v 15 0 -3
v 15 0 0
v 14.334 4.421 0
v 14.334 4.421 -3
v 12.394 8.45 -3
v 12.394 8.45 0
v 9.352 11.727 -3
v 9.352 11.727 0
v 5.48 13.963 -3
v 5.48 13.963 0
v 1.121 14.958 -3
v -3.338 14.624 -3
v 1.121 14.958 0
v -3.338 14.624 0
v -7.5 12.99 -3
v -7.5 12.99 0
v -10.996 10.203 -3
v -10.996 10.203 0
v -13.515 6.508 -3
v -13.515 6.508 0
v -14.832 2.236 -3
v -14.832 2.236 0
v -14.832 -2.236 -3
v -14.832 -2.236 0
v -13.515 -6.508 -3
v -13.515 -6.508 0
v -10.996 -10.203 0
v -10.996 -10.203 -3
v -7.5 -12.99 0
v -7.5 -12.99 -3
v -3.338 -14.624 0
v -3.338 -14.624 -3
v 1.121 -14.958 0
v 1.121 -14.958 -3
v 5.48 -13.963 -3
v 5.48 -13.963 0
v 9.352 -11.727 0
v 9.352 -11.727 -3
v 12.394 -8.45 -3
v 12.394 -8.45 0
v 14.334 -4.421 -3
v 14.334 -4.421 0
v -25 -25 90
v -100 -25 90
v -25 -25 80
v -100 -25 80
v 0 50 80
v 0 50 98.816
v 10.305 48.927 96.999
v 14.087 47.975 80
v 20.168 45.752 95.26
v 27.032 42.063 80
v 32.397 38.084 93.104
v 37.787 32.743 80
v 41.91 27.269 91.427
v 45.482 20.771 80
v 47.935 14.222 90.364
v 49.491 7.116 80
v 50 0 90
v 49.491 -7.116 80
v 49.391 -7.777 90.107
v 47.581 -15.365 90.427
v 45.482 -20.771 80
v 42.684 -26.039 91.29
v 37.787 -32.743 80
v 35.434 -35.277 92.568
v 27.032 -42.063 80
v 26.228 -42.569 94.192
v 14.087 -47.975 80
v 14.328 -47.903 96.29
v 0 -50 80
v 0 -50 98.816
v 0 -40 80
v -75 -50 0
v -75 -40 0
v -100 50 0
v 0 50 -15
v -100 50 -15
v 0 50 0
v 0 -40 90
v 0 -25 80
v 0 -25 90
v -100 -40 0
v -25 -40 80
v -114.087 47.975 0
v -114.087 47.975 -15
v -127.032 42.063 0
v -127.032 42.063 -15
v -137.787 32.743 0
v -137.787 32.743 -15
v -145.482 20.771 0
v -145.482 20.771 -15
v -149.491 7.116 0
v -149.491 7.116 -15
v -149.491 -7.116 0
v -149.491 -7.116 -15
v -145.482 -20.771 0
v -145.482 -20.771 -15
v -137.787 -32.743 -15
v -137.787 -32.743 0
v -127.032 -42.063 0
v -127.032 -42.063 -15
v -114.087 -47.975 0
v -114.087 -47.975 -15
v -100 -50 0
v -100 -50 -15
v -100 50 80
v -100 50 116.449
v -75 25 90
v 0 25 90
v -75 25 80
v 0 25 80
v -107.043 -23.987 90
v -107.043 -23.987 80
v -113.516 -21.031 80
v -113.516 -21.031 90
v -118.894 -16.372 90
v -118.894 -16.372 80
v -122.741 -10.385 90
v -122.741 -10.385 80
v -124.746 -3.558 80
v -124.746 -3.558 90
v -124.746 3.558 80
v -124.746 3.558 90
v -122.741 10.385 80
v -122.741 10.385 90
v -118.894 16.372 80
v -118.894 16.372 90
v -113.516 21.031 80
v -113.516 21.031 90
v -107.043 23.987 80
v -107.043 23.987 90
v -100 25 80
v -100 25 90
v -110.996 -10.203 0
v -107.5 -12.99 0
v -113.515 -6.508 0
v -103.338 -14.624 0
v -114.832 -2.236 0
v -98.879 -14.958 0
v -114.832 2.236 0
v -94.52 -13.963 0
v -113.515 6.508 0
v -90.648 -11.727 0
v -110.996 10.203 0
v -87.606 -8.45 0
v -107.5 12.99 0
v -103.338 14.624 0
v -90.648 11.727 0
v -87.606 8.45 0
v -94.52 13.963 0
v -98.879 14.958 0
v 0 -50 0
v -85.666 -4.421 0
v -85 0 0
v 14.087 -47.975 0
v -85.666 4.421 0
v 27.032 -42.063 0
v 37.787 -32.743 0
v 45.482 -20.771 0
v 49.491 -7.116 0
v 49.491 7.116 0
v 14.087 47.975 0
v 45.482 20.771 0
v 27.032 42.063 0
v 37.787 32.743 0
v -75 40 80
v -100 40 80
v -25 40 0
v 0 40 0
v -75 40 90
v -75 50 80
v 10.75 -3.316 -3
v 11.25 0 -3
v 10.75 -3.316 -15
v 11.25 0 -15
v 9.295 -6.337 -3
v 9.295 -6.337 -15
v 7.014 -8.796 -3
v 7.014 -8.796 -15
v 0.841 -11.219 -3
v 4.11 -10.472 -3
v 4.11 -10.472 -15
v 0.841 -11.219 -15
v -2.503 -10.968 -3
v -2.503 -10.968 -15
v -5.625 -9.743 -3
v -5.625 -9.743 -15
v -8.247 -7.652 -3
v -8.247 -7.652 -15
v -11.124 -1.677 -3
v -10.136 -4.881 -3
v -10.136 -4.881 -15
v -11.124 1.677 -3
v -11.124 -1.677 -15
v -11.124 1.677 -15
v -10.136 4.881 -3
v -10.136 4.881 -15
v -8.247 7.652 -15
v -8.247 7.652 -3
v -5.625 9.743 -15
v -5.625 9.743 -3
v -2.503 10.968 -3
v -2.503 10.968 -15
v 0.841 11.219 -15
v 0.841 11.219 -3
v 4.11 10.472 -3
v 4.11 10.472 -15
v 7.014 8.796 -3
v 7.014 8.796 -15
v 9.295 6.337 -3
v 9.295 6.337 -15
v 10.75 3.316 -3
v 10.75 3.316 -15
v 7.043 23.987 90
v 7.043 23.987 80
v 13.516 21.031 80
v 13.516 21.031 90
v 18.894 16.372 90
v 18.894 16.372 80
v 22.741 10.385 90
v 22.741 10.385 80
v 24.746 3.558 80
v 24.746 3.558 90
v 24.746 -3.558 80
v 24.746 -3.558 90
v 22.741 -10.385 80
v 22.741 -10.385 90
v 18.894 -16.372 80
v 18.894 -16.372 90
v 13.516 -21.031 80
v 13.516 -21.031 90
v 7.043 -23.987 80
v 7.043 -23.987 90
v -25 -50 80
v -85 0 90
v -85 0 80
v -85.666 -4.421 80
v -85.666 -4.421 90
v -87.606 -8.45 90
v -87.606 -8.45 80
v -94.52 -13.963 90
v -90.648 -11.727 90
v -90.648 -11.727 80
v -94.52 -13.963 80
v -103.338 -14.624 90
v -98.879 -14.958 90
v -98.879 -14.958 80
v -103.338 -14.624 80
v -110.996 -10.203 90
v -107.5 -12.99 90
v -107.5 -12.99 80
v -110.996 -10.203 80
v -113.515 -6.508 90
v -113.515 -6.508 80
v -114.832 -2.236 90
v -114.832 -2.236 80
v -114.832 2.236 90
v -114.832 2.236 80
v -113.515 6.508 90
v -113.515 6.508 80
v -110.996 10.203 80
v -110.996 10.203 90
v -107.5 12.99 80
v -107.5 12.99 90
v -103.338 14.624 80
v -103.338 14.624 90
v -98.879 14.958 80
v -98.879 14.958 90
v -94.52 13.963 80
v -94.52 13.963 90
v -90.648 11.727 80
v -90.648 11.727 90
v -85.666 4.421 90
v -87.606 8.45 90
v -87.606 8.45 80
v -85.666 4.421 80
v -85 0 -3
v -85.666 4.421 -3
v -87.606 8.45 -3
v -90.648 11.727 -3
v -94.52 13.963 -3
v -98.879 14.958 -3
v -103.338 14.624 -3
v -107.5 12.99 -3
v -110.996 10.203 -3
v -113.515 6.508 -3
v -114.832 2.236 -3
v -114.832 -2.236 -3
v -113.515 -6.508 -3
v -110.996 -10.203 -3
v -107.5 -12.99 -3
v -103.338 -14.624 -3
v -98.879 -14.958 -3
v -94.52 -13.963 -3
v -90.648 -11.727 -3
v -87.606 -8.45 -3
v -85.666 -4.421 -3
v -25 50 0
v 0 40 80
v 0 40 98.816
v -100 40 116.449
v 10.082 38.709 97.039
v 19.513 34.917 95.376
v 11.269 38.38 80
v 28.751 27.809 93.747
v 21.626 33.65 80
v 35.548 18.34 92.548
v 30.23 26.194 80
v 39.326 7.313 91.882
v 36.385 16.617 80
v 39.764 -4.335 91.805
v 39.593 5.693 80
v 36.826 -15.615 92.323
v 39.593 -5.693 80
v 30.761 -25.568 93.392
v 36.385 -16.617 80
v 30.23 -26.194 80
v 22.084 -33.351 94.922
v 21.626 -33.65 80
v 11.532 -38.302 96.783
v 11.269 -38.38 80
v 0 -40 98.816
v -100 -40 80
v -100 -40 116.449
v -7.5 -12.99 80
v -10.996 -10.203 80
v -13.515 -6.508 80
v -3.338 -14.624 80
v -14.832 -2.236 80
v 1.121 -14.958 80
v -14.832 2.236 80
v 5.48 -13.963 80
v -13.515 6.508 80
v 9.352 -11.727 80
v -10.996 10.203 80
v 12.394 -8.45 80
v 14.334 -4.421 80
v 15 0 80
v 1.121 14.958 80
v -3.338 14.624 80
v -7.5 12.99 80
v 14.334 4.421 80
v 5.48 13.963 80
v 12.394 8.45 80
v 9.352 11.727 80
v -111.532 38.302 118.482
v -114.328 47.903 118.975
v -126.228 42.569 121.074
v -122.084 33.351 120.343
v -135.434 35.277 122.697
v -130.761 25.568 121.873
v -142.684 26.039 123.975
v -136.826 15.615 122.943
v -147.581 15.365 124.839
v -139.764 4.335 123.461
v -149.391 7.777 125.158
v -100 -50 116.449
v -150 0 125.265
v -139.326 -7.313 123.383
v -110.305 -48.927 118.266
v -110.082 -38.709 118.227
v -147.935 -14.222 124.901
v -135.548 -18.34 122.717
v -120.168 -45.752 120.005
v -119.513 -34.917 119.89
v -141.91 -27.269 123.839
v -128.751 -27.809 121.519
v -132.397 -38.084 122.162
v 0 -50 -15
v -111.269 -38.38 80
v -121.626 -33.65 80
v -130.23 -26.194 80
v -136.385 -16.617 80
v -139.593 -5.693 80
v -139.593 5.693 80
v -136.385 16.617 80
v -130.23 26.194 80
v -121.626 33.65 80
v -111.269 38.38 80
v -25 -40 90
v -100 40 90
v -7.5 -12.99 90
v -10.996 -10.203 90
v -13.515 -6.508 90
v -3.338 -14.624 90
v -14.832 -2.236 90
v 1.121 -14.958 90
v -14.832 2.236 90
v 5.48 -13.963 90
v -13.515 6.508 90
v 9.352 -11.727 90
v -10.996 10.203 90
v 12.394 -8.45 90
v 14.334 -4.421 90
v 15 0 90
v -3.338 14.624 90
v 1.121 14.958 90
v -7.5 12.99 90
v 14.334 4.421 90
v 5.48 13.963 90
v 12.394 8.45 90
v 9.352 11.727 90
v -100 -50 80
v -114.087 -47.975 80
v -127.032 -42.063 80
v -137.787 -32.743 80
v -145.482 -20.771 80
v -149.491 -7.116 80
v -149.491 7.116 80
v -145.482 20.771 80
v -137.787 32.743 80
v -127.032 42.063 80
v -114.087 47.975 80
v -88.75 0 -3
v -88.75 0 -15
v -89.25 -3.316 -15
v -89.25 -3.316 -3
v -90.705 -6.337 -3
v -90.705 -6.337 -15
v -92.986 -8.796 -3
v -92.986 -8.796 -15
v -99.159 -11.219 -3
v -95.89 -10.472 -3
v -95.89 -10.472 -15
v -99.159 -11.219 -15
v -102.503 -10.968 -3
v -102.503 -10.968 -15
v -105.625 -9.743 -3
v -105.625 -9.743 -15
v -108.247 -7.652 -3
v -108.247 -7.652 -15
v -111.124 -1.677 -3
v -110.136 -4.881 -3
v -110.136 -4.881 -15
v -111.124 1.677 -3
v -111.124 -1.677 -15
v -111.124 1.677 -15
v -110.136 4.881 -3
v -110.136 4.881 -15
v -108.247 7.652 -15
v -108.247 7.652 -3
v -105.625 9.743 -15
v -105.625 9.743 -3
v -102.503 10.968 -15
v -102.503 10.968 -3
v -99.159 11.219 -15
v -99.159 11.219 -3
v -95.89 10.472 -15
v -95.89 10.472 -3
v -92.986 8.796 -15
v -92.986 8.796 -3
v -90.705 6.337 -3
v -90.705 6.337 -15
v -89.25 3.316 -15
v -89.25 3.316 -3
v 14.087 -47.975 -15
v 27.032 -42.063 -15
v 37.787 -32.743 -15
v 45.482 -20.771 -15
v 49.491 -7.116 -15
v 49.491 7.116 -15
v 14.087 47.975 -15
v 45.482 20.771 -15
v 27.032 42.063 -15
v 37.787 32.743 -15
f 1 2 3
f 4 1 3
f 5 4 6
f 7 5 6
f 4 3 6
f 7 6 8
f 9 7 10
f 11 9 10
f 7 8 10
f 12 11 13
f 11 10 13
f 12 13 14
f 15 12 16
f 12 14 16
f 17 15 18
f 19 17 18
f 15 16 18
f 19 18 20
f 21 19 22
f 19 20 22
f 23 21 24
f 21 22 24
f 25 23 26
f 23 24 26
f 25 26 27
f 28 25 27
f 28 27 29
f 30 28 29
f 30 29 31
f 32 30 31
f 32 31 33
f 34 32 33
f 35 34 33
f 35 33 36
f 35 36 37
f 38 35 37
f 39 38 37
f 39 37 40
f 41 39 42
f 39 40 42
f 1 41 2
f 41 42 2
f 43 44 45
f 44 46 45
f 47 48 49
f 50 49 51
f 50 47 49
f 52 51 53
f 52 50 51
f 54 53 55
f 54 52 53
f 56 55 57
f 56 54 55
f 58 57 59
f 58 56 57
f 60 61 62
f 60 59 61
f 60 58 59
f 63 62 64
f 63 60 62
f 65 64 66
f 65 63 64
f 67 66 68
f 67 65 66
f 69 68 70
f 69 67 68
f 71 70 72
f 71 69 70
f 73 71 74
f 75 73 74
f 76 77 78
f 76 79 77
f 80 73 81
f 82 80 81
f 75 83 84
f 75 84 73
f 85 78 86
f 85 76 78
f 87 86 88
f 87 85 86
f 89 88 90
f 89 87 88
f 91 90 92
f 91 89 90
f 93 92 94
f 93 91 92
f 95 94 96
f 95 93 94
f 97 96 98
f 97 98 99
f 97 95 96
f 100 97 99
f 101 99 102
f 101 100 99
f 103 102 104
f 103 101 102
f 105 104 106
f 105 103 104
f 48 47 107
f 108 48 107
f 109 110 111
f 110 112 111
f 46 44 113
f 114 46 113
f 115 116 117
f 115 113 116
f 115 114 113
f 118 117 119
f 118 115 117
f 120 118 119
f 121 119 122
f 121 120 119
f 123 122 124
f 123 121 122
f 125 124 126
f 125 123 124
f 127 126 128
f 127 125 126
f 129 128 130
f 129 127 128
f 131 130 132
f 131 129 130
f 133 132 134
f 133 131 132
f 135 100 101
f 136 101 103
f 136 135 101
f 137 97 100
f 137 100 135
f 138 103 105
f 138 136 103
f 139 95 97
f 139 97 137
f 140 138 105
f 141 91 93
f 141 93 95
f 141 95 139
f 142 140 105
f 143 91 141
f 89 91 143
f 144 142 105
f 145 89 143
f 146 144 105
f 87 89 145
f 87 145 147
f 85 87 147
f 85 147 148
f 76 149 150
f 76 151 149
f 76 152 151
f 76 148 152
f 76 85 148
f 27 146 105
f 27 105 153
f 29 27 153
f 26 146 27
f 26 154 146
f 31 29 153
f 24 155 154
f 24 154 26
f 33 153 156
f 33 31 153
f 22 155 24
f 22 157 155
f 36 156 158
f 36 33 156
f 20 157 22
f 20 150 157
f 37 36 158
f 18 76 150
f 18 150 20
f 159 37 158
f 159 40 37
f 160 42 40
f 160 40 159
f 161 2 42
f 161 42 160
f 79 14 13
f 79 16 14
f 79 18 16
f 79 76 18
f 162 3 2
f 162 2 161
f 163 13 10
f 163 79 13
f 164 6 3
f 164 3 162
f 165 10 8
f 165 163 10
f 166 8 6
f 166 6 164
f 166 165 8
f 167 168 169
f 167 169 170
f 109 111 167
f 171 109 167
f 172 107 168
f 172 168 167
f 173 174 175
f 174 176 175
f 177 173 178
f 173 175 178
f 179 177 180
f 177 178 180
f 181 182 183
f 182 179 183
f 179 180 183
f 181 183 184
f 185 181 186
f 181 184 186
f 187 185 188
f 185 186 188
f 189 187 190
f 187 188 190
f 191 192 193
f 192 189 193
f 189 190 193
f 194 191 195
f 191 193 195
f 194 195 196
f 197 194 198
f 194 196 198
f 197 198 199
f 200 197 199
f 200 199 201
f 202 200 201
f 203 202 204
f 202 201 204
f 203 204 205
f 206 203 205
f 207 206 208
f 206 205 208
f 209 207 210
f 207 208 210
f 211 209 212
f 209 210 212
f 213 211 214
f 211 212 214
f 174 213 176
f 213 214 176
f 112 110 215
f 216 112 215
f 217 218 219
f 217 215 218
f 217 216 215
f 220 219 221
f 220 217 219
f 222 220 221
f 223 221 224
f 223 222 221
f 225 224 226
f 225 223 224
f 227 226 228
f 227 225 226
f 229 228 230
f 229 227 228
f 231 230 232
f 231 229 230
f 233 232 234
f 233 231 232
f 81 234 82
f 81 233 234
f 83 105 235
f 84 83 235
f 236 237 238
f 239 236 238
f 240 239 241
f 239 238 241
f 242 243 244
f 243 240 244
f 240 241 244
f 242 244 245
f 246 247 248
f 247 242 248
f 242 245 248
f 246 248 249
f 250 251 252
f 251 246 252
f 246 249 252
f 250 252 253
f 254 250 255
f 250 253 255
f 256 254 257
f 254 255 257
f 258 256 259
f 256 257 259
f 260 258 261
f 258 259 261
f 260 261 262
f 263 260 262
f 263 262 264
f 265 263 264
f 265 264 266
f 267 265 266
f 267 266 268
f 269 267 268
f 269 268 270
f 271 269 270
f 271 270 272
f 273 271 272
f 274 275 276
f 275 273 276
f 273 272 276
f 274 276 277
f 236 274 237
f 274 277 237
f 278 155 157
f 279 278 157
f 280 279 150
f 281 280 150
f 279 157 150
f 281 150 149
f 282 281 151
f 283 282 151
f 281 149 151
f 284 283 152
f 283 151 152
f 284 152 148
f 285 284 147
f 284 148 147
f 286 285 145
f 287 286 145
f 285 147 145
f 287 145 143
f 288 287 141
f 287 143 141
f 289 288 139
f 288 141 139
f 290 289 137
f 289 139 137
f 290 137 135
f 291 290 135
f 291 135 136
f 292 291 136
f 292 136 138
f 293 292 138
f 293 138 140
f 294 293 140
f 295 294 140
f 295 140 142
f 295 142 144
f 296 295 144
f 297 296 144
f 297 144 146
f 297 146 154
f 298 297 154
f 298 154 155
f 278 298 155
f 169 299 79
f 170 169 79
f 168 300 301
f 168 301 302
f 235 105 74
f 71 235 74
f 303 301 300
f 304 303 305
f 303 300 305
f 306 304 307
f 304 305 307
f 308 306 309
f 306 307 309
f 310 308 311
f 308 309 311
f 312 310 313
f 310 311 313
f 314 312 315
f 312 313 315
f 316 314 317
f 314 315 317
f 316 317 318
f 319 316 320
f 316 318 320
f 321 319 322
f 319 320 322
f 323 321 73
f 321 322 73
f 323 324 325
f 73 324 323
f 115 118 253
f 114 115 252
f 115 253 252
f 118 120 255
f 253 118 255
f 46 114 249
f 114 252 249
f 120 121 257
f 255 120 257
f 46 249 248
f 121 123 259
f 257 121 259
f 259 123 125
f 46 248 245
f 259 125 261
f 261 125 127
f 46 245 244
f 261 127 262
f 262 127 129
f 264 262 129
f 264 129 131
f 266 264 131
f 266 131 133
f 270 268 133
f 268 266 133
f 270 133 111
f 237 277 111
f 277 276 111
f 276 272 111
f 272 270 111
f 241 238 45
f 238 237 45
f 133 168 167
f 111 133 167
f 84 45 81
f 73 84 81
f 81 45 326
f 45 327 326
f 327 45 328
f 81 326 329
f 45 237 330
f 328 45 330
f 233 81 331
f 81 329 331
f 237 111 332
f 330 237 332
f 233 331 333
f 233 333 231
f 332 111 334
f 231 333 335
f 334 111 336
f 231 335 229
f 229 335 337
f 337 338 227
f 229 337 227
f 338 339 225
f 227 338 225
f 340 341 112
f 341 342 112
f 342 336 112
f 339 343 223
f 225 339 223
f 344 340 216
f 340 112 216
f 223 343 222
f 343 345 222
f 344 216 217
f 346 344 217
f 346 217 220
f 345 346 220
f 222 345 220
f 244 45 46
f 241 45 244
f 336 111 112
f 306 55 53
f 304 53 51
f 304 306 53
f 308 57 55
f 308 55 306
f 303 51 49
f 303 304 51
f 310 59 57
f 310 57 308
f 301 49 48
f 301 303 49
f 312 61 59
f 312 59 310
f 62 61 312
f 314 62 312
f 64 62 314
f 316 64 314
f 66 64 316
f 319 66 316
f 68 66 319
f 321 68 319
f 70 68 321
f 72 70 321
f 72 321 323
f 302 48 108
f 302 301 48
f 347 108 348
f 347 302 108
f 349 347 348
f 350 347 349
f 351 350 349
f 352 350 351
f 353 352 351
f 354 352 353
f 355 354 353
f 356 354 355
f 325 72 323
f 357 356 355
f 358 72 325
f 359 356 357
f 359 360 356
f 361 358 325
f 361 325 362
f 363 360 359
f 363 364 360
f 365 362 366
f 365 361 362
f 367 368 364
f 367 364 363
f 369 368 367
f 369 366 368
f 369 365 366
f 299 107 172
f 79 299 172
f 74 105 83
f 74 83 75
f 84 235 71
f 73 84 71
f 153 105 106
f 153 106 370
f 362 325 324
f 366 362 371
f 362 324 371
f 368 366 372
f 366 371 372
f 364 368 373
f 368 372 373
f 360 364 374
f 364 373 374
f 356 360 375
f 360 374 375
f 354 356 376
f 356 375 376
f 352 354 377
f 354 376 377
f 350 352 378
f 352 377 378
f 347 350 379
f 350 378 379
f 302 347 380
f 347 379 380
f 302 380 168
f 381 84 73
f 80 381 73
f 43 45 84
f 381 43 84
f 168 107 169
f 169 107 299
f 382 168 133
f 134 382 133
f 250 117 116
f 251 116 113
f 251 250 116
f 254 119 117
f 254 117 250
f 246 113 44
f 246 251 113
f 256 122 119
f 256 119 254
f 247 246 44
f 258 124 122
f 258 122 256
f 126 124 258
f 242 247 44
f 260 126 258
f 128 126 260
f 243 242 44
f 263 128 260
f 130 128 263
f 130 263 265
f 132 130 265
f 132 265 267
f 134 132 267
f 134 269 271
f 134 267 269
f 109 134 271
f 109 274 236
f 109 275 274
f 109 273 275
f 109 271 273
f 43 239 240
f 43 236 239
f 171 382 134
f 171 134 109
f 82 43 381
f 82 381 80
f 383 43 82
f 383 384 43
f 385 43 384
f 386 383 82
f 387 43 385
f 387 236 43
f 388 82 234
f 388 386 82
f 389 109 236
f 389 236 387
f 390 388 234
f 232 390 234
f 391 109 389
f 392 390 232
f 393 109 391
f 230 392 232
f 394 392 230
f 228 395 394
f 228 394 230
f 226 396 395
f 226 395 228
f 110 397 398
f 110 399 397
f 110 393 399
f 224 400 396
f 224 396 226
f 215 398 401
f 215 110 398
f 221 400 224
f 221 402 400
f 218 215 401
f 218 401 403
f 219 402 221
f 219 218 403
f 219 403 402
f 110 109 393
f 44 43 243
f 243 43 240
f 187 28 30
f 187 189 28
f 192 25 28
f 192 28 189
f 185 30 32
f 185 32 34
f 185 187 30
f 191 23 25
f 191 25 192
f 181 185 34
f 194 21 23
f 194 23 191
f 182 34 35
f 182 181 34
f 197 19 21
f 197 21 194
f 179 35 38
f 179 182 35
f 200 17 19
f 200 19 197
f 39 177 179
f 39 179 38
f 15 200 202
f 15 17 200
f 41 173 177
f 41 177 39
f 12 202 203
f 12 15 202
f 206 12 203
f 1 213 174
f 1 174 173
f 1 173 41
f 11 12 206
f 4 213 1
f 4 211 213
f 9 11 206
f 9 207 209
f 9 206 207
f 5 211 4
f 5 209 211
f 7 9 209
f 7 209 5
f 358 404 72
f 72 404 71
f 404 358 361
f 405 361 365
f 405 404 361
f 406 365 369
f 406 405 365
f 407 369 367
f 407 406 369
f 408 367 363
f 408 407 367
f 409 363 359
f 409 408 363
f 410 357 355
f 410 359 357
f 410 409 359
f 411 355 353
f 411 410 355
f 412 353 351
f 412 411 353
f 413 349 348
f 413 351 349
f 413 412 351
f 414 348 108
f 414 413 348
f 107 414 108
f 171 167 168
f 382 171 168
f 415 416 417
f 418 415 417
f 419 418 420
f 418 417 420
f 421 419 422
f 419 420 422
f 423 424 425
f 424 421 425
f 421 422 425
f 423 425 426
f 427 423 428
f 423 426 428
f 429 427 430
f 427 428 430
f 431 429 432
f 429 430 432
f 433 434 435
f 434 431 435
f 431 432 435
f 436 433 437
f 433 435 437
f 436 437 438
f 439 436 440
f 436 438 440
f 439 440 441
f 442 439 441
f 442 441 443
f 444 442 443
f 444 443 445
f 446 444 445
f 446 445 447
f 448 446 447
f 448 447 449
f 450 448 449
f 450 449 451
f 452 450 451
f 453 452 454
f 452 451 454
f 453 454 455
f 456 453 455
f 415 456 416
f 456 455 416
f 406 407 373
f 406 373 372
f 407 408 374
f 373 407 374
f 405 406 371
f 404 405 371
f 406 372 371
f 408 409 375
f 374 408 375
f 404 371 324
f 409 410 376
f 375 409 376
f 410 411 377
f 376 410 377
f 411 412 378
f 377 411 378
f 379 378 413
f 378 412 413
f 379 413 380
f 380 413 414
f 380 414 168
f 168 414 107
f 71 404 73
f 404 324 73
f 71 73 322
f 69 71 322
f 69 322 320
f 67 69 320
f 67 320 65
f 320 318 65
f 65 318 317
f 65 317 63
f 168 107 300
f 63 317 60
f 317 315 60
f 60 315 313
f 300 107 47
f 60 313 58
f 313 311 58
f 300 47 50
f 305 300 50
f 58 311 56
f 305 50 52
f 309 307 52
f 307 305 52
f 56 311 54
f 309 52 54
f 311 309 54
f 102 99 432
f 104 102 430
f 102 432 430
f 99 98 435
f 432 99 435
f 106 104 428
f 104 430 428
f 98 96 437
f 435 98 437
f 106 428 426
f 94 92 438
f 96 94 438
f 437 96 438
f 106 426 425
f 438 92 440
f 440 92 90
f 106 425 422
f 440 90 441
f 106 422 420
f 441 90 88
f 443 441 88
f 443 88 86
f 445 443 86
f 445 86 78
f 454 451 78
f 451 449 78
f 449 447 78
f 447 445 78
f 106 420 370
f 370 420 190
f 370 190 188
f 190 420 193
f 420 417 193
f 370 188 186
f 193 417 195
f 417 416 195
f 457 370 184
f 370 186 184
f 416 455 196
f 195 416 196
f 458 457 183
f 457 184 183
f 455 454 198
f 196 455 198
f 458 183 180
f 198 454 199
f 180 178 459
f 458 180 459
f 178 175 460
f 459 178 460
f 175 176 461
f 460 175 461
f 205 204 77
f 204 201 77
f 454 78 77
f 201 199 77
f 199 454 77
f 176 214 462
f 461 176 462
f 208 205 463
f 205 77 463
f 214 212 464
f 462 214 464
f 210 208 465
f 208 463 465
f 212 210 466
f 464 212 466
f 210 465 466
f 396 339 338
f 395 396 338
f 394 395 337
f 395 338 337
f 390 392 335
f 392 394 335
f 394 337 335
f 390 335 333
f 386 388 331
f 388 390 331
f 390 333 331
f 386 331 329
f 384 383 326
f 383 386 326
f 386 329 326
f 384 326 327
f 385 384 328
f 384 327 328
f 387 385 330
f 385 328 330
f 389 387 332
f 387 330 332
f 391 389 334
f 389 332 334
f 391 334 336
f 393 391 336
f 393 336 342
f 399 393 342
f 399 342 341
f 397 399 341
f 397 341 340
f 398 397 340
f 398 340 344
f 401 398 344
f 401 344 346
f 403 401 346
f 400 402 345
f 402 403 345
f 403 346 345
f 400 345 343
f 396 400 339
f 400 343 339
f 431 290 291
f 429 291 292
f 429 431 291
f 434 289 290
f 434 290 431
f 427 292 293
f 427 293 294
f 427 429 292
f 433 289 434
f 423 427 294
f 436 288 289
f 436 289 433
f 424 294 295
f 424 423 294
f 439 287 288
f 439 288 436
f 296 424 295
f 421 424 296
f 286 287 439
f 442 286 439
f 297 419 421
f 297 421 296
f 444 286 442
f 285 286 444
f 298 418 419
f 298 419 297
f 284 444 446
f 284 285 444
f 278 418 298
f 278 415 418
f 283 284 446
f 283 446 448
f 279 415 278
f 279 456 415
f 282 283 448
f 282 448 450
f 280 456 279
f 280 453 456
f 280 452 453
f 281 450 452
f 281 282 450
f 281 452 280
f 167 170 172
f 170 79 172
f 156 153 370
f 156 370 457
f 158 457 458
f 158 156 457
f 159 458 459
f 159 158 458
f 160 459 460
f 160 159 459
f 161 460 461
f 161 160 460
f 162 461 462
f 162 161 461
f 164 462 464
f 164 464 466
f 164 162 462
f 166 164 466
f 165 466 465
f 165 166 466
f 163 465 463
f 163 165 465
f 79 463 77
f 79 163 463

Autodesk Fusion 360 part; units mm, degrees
sketch "Sketch1" plane through (0, 0, 0) normal (0, 0, 1) x (1, 0, 0)
  line L0 (0, 50) -> (-100, 50)
  arc A0 (-100, 50) -> (-100, -50) centre (-100, 0) ccw
  line L1 (-100, -50) -> (0, -50)
  arc A1 (0, -50) -> (0, 50) centre (0, 0) ccw
  line L2 (0, 0) -> (-100, 0) construction
  line L3 (-100, -40) -> (0, -40)
  arc A2 (0, -40) -> (0, 40) centre (0, 0) ccw
  line L4 (0, 40) -> (-100, 40)
  arc A3 (-100, 40) -> (-100, -40) centre (-100, 0) ccw
  arc A4 (-100, 25) -> (-100, -25) centre (-100, 0) ccw
  line L5 (-100, -25) -> (0, -25)
  arc A5 (0, -25) -> (0, 25) centre (0, 0) ccw
  line L6 (0, 25) -> (-100, 25)
  circle A6 centre (0, 0) radius 11.25
  circle A7 centre (0, 0) radius 15
  circle A8 centre (-100, 0) radius 11.25
  circle A9 centre (-100, 0) radius 15
  line L7 (-100, 25) -> (-75, 25)
  line L8 (-75, 25) -> (-75, 40)
  line L9 (-75, 40) -> (-100, 40)
  line L10 (-100, 40) -> (-100, 25)
  line L11 (0, -25) -> (-25, -25)
  line L12 (-25, -25) -> (-25, -40)
  line L13 (-25, -40) -> (0, -40)
  line L14 (0, -40) -> (0, -25)
  dimension "d1" = 100
  dimension "d2" = -10
  dimension "d3" = -25
  dimension "d4" = 22.5
  dimension "d5" = 30
  dimension "d6" = 22.5
  dimension "d7" = 30
  dimension "d8" = 25
extrude "Extrude1" add sketch "Sketch1" against normal blind 15 contours L0 A0 L1 A1 | L3 A3 A4 L5 L10 L12 | L3 L5 L11 L12 L13 L14 | L4 L6 L7 L8 L9 L10 | A2 L4 A5 L6 L8 L14 | A4 L5 A5 L6 L7 L11 makes body 1
extrude "Extrude2" add sketch "Sketch1" along normal blind 10 from surface at 80 separate body contours L3 L5 L11 L12 L13 L14 | L4 L6 L7 L8 L9 L10 | A4 L5 A5 L6 L7 L11 makes body 2
extrude "Extrude3" add sketch "Sketch1" along normal blind 50 from surface at 80 separate body contours L0 A0 L1 A1 makes body 3
sketch "Sketch2" plane through (0, 0, 0) normal (0, 1, 0) x (1, 0, 0)
  line L0 (-25, -80) -> (0, -80)
  line L1 (-25, -90) -> (0, -90)
  line L2 (-100, -80) -> (-25, -80)
  line L3 (-100, -90) -> (-25, -90)
  line L4 (-125, -80) -> (-100, -80)
  line L5 (-125, -90) -> (-100, -90)
  line L6 (0, -80) -> (25, -80)
  line L7 (0, -90) -> (25, -90)
  line L8 (-125, -80) -> (-125, -90)
  line L9 (25, -80) -> (25, -90)
  line L10 (-100, 0) -> (-25, -80)
  line L11 (0, -80) -> (-77.359, 2.5163)
  line L12 (-100, 0) -> (0, 0)
  line L13 (-50, 0) -> (-50, -20)
  line L14 (0, 0) -> (-75, -80)
  line L15 (-100, -80) -> (-22.641, 2.5163)
  line L16 (-100, -80) -> (0, -80)
  line L17 (-100, -130) -> (0, -130)
  line L18 (-150, -80) -> (-100, -80)
  line L19 (-150, -130) -> (-100, -130)
  line L20 (0, -80) -> (50, -80)
  line L21 (0, -130) -> (50, -130)
  line L22 (-150, -80) -> (-150, -130)
  line L23 (50, -80) -> (50, -130)
  line L24 (25, -90) -> (50, -90)
  line L25 (50, -90) -> (-150, -125.2654)
  point P0 (-100, 0)
  dimension "d17" = 10
extrude "Extrude4" cut sketch "Sketch2" along normal through all and the other way through all contours L17 L19 L21 L22 L23 L25 bodies 3
extrude "Extrude5" add sketch "Sketch2" along normal blind 10 from surface at -50 separate body contours L0 L10 L11 L14 L16 | L10 L11 L14 L15 | L10 L11 L12 L15 makes body 4
extrude "Extrude6" add sketch "Sketch2" against normal blind 10 from surface at 50 separate body contours L2 L10 L14 L15 L16 | L10 L11 L14 L15 | L11 L12 L14 L15 makes body 5
extrude "Extrude7" add sketch "Sketch1" along normal blind 12 from surface at -15 contours A7 | A9 bodies 1
